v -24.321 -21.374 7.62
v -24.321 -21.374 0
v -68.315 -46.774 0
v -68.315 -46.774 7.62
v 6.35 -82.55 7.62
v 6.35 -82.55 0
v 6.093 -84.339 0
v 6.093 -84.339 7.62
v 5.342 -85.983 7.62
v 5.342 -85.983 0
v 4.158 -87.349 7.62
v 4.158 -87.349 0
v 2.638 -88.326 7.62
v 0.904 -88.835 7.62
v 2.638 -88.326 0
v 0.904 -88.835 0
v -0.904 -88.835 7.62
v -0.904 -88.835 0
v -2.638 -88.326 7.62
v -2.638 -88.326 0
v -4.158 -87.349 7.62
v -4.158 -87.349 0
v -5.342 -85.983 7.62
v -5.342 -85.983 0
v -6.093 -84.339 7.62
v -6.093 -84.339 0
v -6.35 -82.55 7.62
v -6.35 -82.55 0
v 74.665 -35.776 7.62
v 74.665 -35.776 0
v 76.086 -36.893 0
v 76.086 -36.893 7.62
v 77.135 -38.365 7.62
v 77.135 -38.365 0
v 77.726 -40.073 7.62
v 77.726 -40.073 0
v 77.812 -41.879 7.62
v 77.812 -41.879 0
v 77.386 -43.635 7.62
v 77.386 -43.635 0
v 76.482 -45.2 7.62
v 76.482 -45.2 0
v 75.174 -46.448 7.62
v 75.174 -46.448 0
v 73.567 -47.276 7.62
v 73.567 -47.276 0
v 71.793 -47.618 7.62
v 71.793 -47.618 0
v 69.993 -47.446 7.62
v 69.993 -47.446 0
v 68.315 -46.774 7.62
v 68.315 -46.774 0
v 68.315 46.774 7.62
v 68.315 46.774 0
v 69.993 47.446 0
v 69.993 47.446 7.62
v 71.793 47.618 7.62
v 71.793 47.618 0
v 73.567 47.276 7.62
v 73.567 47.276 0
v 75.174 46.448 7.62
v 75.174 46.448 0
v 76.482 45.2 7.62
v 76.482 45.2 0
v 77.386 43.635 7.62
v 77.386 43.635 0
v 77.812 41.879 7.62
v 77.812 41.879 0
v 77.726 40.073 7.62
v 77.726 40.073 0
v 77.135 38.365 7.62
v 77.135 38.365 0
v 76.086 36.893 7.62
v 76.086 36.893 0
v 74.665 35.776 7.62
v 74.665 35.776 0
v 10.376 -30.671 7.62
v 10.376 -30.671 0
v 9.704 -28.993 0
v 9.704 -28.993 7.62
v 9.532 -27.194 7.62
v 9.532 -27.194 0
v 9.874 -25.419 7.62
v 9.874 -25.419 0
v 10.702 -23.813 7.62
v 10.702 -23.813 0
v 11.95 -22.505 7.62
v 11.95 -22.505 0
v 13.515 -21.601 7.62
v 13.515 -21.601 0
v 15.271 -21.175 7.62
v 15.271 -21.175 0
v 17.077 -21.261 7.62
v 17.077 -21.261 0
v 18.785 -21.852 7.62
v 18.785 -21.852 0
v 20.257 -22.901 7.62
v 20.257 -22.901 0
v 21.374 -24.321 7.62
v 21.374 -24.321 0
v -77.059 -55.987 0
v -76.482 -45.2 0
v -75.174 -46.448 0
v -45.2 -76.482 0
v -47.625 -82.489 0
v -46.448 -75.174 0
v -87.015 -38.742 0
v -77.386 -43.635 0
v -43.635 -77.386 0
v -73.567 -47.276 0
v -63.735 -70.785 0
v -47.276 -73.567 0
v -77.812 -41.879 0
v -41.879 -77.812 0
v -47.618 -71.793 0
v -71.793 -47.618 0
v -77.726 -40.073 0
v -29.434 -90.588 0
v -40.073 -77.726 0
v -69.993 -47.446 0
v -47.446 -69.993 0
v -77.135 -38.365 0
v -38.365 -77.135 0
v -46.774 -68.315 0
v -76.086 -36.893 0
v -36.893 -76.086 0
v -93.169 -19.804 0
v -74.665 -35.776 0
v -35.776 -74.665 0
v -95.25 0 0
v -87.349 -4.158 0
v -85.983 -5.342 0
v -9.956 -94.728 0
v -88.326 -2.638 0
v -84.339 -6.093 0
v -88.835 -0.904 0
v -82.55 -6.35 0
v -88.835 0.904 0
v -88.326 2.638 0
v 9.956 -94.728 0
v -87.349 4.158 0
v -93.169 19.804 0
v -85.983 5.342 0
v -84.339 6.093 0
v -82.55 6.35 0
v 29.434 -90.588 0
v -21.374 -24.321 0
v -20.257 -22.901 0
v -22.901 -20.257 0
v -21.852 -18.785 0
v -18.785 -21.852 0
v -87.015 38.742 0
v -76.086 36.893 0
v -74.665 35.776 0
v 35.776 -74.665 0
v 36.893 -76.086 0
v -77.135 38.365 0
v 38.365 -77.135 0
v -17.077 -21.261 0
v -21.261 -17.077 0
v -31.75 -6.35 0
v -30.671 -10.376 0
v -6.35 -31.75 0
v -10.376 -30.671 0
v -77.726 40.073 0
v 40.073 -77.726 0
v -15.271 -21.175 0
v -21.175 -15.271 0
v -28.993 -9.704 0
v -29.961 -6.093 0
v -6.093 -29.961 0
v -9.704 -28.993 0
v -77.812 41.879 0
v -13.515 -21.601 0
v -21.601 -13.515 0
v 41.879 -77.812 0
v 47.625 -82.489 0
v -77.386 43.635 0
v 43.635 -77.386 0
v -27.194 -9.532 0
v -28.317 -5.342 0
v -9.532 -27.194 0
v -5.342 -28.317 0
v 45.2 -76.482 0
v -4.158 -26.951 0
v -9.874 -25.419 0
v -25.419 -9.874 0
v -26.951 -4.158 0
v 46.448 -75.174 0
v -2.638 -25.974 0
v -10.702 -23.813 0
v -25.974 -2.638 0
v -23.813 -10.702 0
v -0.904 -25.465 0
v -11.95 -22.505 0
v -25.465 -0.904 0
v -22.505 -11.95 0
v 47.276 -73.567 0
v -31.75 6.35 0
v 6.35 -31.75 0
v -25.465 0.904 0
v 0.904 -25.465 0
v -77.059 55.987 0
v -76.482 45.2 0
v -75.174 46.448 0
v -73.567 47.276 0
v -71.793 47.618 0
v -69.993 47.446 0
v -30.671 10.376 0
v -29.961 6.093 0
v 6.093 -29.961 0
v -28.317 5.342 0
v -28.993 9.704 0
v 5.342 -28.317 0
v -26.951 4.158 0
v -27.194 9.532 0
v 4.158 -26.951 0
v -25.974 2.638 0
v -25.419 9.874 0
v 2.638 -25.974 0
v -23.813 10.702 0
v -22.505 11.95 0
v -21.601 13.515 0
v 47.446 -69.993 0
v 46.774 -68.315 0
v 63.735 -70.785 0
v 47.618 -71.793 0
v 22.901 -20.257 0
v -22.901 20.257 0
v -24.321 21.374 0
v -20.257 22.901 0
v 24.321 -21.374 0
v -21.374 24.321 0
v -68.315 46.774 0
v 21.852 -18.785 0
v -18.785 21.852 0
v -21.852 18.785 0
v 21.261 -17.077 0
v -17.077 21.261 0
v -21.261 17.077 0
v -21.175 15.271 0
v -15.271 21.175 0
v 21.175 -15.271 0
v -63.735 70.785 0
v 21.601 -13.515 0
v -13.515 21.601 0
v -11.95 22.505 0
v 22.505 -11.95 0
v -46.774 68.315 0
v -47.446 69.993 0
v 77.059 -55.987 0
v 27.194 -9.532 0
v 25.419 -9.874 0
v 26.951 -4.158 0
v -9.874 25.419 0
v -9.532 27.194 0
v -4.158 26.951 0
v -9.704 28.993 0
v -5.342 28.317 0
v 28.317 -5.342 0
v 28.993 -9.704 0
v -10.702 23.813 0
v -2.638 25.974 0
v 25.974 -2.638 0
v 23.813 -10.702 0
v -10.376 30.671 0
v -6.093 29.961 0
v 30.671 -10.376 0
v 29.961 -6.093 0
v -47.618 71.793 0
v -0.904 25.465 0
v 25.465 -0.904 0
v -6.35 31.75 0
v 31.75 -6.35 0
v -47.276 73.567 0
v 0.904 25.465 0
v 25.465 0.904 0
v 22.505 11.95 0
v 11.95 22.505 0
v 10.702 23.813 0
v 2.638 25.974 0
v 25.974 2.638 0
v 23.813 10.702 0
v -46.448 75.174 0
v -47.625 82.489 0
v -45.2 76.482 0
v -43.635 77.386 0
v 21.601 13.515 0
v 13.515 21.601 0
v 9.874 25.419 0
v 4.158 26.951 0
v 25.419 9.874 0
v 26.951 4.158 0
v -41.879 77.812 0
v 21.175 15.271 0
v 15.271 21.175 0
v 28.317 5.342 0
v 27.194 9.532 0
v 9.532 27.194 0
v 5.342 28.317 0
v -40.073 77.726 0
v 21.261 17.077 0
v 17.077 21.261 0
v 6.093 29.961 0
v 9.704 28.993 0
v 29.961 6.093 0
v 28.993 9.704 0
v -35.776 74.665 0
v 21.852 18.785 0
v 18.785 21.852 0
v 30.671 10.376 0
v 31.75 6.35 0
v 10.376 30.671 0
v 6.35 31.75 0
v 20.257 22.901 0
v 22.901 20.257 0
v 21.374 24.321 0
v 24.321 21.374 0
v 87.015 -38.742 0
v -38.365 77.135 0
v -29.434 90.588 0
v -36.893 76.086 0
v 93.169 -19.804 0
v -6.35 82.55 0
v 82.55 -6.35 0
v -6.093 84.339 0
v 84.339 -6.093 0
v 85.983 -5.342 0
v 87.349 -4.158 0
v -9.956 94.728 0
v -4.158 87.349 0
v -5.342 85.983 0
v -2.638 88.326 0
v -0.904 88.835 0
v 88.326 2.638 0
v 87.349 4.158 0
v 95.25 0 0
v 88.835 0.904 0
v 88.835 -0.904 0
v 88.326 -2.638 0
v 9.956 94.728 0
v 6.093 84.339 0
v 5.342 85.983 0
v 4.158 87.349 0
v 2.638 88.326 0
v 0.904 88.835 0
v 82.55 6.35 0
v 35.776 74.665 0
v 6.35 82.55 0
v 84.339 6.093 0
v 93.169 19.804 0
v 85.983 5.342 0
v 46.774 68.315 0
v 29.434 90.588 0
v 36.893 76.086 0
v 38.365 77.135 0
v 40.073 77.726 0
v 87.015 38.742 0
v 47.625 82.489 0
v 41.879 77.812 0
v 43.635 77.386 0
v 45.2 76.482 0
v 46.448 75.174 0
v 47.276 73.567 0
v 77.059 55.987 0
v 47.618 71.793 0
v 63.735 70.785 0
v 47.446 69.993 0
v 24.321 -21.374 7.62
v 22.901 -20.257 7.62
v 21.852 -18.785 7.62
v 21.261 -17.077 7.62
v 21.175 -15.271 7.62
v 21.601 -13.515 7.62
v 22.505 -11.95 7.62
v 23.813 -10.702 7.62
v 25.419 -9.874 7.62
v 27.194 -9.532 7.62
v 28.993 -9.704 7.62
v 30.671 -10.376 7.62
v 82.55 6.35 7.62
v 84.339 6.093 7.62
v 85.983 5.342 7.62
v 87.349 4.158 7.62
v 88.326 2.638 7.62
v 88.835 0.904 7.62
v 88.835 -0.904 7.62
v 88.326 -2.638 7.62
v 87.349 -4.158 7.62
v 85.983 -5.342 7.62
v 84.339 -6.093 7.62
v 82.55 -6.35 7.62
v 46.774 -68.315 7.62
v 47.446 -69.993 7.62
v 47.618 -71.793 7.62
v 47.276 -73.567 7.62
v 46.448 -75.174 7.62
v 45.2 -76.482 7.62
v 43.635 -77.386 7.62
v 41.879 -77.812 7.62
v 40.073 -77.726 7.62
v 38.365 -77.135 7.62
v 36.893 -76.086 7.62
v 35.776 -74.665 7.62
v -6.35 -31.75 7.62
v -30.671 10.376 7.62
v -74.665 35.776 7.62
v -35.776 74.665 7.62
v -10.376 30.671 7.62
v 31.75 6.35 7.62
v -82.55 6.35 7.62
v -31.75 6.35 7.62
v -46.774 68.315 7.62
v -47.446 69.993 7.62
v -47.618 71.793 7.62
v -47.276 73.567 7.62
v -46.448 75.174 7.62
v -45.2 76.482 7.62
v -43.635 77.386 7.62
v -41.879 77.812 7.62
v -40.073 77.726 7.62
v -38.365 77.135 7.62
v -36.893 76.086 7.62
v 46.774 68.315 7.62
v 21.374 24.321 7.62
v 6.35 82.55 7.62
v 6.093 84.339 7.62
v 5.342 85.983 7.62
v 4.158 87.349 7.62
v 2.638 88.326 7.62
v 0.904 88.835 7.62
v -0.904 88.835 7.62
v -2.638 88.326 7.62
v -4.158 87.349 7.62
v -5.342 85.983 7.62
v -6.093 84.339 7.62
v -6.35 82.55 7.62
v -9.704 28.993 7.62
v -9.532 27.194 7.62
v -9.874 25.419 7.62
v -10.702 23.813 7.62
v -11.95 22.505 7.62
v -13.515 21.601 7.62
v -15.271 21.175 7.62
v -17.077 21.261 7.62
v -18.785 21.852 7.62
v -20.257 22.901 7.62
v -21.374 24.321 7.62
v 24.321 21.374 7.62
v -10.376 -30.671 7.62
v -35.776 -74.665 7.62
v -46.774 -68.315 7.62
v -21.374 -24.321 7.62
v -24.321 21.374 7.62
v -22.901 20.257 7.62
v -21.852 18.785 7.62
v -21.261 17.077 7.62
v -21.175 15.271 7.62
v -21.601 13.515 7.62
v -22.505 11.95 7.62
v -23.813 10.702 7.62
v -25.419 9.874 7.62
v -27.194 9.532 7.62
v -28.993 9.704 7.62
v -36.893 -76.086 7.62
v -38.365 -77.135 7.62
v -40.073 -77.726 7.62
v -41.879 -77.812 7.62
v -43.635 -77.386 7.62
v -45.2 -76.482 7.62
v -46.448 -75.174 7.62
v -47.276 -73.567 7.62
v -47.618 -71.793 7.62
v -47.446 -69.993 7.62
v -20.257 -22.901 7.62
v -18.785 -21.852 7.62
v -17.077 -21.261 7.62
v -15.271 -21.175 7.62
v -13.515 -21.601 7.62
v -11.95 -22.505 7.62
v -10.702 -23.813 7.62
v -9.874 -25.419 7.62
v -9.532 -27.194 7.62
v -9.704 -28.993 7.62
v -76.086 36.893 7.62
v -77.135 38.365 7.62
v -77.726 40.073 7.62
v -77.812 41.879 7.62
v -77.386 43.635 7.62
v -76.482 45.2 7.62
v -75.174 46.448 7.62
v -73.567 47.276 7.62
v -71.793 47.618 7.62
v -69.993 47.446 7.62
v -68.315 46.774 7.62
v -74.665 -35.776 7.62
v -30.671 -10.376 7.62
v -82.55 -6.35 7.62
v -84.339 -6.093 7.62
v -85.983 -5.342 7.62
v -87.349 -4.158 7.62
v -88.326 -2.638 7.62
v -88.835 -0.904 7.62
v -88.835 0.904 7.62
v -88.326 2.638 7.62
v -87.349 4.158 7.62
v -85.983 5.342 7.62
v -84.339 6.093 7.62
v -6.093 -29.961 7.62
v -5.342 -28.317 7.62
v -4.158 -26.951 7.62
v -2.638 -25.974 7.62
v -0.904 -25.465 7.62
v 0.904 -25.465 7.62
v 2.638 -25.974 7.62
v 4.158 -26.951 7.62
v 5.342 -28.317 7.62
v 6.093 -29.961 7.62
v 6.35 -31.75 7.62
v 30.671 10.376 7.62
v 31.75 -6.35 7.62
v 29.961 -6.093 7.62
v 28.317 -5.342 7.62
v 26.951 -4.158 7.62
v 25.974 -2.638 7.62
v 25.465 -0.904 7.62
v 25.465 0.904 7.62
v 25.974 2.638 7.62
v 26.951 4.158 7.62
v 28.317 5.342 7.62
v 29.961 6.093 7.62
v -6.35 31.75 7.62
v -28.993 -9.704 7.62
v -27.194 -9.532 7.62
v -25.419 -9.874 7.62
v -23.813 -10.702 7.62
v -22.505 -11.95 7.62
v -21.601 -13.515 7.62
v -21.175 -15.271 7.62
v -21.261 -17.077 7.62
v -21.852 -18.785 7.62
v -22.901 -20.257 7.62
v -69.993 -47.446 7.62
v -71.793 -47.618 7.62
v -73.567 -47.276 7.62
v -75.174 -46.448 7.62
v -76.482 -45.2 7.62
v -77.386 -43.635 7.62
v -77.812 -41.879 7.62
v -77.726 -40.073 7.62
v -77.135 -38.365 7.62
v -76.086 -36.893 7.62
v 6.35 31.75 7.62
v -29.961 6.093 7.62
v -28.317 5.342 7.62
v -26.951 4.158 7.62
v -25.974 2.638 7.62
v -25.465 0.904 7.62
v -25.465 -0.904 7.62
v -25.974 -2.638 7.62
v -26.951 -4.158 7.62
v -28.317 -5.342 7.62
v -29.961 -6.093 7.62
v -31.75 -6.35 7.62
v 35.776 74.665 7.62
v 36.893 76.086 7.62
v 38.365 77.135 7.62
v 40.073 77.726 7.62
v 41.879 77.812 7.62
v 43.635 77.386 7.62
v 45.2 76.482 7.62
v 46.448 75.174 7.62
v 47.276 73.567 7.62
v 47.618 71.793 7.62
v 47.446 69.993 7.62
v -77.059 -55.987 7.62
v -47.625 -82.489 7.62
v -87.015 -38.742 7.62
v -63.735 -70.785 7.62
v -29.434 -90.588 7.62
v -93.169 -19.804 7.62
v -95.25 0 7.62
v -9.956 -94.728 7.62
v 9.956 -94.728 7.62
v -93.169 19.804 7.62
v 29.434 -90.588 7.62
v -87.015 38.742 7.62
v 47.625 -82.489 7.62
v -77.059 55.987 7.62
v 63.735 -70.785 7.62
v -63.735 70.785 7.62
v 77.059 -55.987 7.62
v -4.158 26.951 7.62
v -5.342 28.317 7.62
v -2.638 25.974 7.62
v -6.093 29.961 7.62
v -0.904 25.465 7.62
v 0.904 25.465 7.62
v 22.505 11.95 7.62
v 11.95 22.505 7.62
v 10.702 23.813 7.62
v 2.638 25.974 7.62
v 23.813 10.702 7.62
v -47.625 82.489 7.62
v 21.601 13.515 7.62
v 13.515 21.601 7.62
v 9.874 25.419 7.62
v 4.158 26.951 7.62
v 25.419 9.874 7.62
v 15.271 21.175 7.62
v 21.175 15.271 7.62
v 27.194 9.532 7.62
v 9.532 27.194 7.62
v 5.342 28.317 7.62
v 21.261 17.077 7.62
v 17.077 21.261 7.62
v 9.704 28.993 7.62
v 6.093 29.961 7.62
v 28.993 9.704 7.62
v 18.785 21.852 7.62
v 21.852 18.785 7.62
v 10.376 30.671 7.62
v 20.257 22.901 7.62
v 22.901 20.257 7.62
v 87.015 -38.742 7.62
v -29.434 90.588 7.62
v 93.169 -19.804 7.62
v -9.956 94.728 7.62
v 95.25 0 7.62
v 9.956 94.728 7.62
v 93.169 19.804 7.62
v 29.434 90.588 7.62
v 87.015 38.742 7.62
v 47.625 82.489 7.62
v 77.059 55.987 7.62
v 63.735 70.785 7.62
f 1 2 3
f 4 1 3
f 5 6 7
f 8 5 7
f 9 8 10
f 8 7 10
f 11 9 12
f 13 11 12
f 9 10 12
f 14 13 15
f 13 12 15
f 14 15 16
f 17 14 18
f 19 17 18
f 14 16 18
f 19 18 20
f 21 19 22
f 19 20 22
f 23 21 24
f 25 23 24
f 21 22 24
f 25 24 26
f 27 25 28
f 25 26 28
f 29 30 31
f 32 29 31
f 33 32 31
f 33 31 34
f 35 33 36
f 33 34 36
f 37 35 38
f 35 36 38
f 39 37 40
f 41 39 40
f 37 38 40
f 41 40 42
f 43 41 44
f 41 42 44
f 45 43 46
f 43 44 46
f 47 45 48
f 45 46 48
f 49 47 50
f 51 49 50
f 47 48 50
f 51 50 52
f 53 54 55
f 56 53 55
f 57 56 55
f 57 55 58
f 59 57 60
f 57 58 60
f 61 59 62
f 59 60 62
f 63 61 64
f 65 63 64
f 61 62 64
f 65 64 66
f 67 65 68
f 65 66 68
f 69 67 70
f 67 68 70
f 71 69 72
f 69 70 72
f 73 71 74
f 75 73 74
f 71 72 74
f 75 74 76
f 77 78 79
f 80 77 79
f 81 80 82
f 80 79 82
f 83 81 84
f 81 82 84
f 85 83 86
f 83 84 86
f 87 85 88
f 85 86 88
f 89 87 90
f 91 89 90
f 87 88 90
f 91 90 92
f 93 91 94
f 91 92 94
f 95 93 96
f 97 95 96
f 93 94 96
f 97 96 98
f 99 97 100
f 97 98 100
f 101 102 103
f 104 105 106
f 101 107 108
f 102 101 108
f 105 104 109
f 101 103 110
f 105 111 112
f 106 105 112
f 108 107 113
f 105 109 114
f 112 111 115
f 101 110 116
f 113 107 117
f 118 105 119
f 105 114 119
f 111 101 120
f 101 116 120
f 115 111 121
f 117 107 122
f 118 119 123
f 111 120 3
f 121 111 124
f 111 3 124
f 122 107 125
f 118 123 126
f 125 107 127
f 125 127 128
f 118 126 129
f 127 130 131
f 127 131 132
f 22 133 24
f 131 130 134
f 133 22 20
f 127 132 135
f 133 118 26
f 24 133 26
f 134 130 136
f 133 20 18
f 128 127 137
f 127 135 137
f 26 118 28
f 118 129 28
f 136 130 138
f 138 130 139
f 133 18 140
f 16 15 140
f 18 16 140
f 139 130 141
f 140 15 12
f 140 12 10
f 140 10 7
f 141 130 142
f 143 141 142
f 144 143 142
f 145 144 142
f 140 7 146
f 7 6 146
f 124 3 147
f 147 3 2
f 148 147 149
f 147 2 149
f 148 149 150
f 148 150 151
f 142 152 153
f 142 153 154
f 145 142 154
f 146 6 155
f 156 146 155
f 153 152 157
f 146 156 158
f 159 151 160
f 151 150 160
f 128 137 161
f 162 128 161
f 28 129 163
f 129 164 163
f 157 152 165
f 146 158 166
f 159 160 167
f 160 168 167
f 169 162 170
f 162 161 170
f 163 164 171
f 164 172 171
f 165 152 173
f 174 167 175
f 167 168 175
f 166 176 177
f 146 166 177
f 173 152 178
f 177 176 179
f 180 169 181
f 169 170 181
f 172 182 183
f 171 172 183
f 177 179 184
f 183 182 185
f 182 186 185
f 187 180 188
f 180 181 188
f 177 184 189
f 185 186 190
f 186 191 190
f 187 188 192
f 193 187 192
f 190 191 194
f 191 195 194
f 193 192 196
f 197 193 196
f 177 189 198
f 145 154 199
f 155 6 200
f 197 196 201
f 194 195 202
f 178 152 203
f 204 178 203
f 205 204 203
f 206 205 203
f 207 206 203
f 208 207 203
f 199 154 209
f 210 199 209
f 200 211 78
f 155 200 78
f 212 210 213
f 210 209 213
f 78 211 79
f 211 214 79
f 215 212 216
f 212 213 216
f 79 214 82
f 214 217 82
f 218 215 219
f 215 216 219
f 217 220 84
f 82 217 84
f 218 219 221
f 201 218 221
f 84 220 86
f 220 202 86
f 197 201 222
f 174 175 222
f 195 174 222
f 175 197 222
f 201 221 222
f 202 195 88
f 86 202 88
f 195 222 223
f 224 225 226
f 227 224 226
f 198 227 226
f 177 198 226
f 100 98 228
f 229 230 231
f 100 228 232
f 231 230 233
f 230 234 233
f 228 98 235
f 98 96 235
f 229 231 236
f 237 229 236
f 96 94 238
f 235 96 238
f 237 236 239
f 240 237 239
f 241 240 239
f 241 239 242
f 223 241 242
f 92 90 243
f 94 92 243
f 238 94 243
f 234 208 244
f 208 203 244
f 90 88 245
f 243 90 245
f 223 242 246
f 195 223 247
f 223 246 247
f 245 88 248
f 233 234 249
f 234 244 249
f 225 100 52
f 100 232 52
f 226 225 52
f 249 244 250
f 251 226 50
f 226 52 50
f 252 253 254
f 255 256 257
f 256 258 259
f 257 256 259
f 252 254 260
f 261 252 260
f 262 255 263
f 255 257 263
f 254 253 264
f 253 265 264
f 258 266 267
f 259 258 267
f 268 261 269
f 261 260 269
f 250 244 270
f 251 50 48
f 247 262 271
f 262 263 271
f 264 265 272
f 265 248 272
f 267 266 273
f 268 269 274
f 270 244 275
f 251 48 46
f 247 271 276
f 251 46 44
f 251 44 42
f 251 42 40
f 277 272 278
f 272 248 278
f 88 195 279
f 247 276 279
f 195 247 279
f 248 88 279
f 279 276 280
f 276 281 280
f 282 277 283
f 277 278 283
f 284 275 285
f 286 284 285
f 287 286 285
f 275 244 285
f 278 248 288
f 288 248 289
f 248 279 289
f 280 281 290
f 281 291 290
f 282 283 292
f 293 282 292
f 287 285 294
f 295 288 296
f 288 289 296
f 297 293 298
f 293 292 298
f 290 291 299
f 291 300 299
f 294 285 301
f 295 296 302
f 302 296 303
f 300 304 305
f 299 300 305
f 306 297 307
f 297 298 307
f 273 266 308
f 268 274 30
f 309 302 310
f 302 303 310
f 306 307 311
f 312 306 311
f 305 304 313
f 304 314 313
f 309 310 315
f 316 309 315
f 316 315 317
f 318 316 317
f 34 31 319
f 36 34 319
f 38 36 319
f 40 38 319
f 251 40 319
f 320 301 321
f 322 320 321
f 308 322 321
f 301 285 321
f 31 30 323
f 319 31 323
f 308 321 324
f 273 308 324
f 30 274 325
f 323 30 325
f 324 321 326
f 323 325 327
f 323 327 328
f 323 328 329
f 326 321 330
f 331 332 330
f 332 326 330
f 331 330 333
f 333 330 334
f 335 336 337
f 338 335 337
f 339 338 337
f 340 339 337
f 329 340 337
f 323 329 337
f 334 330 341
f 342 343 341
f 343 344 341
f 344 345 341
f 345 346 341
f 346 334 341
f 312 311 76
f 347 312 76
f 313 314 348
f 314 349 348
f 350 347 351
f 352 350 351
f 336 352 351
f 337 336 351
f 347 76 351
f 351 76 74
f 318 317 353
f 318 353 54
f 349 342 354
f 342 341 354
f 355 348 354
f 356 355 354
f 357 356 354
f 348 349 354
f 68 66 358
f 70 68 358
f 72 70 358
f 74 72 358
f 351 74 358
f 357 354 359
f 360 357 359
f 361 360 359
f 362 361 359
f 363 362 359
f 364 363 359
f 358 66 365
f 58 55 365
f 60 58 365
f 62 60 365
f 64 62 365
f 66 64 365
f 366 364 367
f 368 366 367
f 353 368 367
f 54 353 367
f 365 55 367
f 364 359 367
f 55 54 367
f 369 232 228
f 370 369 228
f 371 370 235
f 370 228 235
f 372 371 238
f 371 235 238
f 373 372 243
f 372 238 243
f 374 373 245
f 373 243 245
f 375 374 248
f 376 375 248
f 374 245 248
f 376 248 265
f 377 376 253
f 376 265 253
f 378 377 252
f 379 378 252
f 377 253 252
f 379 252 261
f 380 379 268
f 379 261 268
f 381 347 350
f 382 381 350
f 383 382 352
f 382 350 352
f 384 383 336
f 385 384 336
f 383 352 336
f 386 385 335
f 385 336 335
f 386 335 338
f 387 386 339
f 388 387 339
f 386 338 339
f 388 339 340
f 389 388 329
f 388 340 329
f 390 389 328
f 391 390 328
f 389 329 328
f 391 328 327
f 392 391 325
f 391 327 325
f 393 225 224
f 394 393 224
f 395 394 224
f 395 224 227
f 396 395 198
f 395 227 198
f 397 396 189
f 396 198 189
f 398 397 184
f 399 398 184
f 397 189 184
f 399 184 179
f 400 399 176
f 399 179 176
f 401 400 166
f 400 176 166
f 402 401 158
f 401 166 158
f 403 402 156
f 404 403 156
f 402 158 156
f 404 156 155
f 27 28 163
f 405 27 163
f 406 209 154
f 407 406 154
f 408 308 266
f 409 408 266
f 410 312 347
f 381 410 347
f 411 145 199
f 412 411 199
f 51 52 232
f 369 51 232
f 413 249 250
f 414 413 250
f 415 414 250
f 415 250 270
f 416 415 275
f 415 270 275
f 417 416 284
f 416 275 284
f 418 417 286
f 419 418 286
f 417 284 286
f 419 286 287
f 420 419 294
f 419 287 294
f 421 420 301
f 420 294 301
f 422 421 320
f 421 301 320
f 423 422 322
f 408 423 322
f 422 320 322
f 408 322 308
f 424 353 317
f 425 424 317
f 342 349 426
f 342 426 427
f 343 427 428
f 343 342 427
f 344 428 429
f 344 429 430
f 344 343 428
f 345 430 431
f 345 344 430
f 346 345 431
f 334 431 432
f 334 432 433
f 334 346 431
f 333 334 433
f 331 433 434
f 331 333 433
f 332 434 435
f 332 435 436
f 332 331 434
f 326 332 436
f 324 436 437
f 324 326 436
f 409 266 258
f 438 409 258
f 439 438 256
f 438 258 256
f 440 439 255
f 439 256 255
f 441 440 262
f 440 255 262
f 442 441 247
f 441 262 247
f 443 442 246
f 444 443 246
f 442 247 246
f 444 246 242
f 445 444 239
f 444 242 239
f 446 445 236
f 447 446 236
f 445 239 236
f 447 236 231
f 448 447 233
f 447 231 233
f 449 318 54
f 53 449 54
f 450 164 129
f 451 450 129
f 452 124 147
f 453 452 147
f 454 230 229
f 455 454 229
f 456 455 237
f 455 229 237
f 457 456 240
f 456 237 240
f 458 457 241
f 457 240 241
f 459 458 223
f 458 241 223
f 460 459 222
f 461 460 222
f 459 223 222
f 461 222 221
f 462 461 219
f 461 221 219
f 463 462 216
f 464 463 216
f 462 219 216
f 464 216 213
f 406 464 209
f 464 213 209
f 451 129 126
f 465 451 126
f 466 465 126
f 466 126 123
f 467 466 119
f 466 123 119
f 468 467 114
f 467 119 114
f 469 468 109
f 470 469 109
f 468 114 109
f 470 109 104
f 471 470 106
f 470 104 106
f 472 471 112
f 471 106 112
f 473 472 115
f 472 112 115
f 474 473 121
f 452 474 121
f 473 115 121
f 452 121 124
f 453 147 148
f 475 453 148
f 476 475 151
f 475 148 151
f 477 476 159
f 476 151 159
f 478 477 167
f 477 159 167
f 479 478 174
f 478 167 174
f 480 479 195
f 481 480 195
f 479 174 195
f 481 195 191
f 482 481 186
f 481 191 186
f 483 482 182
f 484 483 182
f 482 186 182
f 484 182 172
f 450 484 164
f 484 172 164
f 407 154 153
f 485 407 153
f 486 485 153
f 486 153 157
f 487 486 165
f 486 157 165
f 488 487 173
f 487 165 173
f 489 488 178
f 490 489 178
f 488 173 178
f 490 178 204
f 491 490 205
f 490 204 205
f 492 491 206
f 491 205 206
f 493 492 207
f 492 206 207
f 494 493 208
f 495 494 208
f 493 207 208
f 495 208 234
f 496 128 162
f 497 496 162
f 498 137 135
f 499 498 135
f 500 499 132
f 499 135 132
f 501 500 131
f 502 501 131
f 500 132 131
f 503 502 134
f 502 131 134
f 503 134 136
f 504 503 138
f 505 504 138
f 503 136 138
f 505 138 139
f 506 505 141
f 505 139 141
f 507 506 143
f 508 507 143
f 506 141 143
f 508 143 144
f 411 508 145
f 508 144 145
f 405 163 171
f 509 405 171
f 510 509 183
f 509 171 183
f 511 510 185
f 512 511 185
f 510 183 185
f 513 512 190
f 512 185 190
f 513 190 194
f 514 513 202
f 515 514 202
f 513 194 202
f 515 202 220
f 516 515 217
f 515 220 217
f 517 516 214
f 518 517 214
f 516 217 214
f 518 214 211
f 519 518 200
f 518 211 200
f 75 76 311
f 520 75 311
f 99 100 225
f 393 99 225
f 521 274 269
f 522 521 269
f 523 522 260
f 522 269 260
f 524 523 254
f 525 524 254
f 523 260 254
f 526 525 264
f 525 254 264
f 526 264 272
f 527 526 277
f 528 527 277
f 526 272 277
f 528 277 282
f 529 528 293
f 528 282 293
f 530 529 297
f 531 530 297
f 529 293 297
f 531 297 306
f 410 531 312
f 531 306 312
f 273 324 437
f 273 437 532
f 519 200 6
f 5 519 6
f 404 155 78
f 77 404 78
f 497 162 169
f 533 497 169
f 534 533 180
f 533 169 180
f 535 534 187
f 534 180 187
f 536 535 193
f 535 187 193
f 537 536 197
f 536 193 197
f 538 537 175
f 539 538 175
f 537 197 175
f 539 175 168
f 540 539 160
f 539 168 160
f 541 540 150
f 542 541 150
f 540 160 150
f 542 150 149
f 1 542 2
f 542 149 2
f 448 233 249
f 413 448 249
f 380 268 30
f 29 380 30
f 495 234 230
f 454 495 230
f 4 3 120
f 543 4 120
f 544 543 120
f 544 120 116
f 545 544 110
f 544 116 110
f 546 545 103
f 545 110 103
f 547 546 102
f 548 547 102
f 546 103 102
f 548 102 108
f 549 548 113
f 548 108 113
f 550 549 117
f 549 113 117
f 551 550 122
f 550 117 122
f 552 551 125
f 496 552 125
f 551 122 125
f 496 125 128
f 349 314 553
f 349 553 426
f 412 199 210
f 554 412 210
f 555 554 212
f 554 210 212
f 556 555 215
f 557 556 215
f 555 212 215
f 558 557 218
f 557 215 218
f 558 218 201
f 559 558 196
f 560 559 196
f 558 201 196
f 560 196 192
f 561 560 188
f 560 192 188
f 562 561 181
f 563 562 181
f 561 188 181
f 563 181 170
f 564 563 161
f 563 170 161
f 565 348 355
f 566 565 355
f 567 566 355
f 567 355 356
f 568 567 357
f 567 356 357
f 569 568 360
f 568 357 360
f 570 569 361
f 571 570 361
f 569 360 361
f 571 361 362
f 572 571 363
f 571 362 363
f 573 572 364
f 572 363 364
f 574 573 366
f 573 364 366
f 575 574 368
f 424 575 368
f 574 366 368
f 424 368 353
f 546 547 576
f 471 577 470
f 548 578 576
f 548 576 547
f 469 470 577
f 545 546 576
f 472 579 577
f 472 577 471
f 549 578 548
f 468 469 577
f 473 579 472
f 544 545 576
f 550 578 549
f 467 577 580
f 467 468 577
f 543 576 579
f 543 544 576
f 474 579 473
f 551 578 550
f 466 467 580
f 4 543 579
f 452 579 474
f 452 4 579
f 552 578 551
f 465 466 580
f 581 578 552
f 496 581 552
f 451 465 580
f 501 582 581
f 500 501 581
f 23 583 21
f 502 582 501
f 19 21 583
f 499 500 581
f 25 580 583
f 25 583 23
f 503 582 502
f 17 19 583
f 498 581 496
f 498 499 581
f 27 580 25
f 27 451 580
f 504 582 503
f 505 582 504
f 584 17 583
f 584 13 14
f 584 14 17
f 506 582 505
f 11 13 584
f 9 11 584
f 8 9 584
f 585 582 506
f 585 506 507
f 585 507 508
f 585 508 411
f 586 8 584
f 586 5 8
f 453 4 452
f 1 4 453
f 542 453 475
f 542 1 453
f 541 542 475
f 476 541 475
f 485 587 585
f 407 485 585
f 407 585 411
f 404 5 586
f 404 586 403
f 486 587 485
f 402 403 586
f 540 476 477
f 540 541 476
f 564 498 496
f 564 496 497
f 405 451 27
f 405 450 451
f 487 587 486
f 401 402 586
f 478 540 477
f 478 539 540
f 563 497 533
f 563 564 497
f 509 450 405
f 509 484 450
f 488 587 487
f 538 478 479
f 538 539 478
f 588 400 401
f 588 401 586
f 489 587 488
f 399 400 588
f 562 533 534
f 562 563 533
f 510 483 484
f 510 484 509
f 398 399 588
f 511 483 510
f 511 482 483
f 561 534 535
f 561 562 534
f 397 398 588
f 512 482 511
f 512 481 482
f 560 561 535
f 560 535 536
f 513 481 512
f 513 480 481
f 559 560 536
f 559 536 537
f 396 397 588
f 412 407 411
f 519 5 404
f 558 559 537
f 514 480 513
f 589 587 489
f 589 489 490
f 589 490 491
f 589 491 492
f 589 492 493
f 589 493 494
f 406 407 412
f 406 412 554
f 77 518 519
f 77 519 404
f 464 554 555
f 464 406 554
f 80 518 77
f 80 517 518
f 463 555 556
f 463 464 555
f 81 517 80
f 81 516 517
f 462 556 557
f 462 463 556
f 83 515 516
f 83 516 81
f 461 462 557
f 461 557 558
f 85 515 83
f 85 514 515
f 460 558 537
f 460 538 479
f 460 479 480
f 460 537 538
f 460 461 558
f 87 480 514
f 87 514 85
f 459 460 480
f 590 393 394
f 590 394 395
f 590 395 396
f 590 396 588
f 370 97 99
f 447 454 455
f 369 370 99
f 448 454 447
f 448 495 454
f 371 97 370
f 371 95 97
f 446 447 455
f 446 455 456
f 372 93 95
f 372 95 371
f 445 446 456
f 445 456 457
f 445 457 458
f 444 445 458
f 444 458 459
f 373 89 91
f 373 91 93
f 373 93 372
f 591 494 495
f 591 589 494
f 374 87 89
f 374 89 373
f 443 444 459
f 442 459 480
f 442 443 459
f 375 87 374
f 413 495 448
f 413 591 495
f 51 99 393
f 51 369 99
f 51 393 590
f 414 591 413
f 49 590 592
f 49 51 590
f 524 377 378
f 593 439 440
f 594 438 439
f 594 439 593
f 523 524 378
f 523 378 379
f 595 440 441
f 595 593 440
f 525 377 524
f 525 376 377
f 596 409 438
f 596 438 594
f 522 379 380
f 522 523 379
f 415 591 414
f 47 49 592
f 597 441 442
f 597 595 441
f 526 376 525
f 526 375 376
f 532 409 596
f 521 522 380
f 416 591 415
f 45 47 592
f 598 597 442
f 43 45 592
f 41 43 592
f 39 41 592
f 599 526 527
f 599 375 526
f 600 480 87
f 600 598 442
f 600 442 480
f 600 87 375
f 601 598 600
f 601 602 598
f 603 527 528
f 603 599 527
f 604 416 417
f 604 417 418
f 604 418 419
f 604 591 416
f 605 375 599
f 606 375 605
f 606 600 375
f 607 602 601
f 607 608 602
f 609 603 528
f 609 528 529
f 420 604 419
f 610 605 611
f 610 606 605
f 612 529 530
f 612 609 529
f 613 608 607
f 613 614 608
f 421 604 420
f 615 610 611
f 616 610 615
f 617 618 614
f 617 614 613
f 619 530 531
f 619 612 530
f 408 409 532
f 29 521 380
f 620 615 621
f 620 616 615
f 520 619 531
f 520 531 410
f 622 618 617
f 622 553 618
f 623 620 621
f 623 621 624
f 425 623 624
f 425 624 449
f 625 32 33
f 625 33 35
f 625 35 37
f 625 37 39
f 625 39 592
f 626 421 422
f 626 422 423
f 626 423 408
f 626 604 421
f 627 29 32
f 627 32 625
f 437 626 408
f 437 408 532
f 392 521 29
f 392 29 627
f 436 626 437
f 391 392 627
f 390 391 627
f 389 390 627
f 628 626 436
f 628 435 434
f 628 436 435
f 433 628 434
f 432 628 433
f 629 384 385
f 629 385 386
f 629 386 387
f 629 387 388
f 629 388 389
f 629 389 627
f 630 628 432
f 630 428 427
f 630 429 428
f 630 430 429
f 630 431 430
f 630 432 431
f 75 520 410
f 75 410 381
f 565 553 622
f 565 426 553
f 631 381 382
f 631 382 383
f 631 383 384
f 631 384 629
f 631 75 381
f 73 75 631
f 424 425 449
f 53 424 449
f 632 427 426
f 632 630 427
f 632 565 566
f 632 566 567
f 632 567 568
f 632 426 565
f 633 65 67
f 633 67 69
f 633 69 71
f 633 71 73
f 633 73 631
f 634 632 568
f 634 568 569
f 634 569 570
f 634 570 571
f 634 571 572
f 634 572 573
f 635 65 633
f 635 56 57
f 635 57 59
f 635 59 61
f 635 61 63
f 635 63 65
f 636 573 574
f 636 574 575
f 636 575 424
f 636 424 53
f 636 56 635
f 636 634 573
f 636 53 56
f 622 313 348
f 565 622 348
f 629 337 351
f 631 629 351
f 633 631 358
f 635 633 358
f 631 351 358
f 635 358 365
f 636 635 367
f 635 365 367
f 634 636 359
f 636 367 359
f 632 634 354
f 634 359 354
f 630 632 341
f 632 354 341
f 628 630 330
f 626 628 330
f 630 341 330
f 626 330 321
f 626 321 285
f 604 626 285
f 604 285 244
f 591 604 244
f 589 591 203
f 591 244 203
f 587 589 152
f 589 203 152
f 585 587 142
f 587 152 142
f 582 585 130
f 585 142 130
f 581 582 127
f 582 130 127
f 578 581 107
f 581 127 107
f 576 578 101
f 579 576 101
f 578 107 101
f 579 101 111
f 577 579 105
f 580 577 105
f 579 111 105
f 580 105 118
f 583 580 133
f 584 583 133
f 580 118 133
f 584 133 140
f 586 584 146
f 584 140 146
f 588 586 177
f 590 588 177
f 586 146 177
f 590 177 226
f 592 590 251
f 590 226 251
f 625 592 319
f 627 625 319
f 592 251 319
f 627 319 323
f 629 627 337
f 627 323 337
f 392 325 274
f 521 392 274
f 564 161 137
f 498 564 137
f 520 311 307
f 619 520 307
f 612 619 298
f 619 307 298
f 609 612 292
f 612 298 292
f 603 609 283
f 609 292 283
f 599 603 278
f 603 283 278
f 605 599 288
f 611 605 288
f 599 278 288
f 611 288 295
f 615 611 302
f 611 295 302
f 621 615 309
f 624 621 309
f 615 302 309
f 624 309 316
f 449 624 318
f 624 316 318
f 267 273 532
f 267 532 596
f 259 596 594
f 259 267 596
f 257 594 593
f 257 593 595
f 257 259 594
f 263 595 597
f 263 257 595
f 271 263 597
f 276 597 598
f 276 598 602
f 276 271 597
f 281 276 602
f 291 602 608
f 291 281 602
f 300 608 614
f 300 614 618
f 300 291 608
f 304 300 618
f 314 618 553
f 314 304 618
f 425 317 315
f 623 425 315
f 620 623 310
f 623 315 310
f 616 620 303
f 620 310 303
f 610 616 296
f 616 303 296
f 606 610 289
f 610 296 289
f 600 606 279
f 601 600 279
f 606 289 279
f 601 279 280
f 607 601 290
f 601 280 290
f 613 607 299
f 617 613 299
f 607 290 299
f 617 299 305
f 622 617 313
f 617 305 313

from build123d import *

# Parameters (mm, degrees)
SKETCH1_R           = 95.25
BOSS_EXTRUDE1_DEPTH = 7.62


with BuildPart() as part:
    # Sketch1 → Boss-Extrude1 (new body)
    with BuildSketch(Plane.XY):
        Circle(SKETCH1_R)
        with BuildLine():
            Line((-6.35, 82.55), (-6.35, 31.75))
            ThreePointArc((-6.35, 31.75), (0, 25.4), (6.35, 31.75))
            Line((6.35, 31.75), (6.35, 82.55))
            ThreePointArc((6.35, 82.55), (0, 88.9), (-6.35, 82.55))
        make_face(mode=Mode.SUBTRACT)
        with BuildLine():
            Line((46.774261314, 68.315397082), (21.374261314, 24.32130657))
            ThreePointArc((21.374261314, 24.32130657), (12.7, 21.997045256), (10.375738686, 30.67130657))
            Line((10.375738686, 30.67130657), (35.775738686, 74.665397082))
            ThreePointArc((35.775738686, 74.665397082), (44.45, 76.989658396), (46.774261314, 68.315397082))
        make_face(mode=Mode.SUBTRACT)
        with BuildLine():
            Line((74.665397082, 35.775738686), (30.67130657, 10.375738686))
            ThreePointArc((30.67130657, 10.375738686), (21.997045256, 12.7), (24.32130657, 21.374261314))
            Line((24.32130657, 21.374261314), (68.315397082, 46.774261314))
            ThreePointArc((68.315397082, 46.774261314), (76.989658396, 44.45), (74.665397082, 35.775738686))
        make_face(mode=Mode.SUBTRACT)
        with BuildLine():
            Line((82.55, -6.35), (31.75, -6.35))
            ThreePointArc((31.75, -6.35), (25.4, 0), (31.75, 6.35))
            Line((31.75, 6.35), (82.55, 6.35))
            ThreePointArc((82.55, 6.35), (88.9, 0), (82.55, -6.35))
        make_face(mode=Mode.SUBTRACT)
        with BuildLine():
            Line((68.315397082, -46.774261314), (24.32130657, -21.374261314))
            ThreePointArc((24.32130657, -21.374261314), (21.997045256, -12.7), (30.67130657, -10.375738686))
            Line((30.67130657, -10.375738686), (74.665397082, -35.775738686))
            ThreePointArc((74.665397082, -35.775738686), (76.989658396, -44.45), (68.315397082, -46.774261314))
        make_face(mode=Mode.SUBTRACT)
        with BuildLine():
            Line((35.775738686, -74.665397082), (10.375738686, -30.67130657))
            ThreePointArc((10.375738686, -30.67130657), (12.7, -21.997045256), (21.374261314, -24.32130657))
            Line((21.374261314, -24.32130657), (46.774261314, -68.315397082))
            ThreePointArc((46.774261314, -68.315397082), (44.45, -76.989658396), (35.775738686, -74.665397082))
        make_face(mode=Mode.SUBTRACT)
        with BuildLine():
            Line((-6.35, -82.55), (-6.35, -31.75))
            ThreePointArc((-6.35, -31.75), (0, -25.4), (6.35, -31.75))
            Line((6.35, -31.75), (6.35, -82.55))
            ThreePointArc((6.35, -82.55), (0, -88.9), (-6.35, -82.55))
        make_face(mode=Mode.SUBTRACT)
        with BuildLine():
            Line((-46.774261314, -68.315397082), (-21.374261314, -24.32130657))
            ThreePointArc((-21.374261314, -24.32130657), (-12.7, -21.997045256), (-10.375738686, -30.67130657))
            Line((-10.375738686, -30.67130657), (-35.775738686, -74.665397082))
            ThreePointArc((-35.775738686, -74.665397082), (-44.45, -76.989658396), (-46.774261314, -68.315397082))
        make_face(mode=Mode.SUBTRACT)
        with BuildLine():
            Line((-74.665397082, -35.775738686), (-30.67130657, -10.375738686))
            ThreePointArc((-30.67130657, -10.375738686), (-21.997045256, -12.7), (-24.32130657, -21.374261314))
            Line((-24.32130657, -21.374261314), (-68.315397082, -46.774261314))
            ThreePointArc((-68.315397082, -46.774261314), (-76.989658396, -44.45), (-74.665397082, -35.775738686))
        make_face(mode=Mode.SUBTRACT)
        with BuildLine():
            Line((-82.55, 6.35), (-31.75, 6.35))
            ThreePointArc((-31.75, 6.35), (-25.4, 0), (-31.75, -6.35))
            Line((-31.75, -6.35), (-82.55, -6.35))
            ThreePointArc((-82.55, -6.35), (-88.9, 0), (-82.55, 6.35))
        make_face(mode=Mode.SUBTRACT)
        with BuildLine():
            Line((-68.315397082, 46.774261314), (-24.32130657, 21.374261314))
            ThreePointArc((-24.32130657, 21.374261314), (-21.997045256, 12.7), (-30.67130657, 10.375738686))
            Line((-30.67130657, 10.375738686), (-74.665397082, 35.775738686))
            ThreePointArc((-74.665397082, 35.775738686), (-76.989658396, 44.45), (-68.315397082, 46.774261314))
        make_face(mode=Mode.SUBTRACT)
        with BuildLine():
            Line((-35.775738686, 74.665397082), (-10.375738686, 30.67130657))
            ThreePointArc((-10.375738686, 30.67130657), (-12.7, 21.997045256), (-21.374261314, 24.32130657))
            Line((-21.374261314, 24.32130657), (-46.774261314, 68.315397082))
            ThreePointArc((-46.774261314, 68.315397082), (-44.45, 76.989658396), (-35.775738686, 74.665397082))
        make_face(mode=Mode.SUBTRACT)
    extrude(amount=BOSS_EXTRUDE1_DEPTH)


solid = part.part
